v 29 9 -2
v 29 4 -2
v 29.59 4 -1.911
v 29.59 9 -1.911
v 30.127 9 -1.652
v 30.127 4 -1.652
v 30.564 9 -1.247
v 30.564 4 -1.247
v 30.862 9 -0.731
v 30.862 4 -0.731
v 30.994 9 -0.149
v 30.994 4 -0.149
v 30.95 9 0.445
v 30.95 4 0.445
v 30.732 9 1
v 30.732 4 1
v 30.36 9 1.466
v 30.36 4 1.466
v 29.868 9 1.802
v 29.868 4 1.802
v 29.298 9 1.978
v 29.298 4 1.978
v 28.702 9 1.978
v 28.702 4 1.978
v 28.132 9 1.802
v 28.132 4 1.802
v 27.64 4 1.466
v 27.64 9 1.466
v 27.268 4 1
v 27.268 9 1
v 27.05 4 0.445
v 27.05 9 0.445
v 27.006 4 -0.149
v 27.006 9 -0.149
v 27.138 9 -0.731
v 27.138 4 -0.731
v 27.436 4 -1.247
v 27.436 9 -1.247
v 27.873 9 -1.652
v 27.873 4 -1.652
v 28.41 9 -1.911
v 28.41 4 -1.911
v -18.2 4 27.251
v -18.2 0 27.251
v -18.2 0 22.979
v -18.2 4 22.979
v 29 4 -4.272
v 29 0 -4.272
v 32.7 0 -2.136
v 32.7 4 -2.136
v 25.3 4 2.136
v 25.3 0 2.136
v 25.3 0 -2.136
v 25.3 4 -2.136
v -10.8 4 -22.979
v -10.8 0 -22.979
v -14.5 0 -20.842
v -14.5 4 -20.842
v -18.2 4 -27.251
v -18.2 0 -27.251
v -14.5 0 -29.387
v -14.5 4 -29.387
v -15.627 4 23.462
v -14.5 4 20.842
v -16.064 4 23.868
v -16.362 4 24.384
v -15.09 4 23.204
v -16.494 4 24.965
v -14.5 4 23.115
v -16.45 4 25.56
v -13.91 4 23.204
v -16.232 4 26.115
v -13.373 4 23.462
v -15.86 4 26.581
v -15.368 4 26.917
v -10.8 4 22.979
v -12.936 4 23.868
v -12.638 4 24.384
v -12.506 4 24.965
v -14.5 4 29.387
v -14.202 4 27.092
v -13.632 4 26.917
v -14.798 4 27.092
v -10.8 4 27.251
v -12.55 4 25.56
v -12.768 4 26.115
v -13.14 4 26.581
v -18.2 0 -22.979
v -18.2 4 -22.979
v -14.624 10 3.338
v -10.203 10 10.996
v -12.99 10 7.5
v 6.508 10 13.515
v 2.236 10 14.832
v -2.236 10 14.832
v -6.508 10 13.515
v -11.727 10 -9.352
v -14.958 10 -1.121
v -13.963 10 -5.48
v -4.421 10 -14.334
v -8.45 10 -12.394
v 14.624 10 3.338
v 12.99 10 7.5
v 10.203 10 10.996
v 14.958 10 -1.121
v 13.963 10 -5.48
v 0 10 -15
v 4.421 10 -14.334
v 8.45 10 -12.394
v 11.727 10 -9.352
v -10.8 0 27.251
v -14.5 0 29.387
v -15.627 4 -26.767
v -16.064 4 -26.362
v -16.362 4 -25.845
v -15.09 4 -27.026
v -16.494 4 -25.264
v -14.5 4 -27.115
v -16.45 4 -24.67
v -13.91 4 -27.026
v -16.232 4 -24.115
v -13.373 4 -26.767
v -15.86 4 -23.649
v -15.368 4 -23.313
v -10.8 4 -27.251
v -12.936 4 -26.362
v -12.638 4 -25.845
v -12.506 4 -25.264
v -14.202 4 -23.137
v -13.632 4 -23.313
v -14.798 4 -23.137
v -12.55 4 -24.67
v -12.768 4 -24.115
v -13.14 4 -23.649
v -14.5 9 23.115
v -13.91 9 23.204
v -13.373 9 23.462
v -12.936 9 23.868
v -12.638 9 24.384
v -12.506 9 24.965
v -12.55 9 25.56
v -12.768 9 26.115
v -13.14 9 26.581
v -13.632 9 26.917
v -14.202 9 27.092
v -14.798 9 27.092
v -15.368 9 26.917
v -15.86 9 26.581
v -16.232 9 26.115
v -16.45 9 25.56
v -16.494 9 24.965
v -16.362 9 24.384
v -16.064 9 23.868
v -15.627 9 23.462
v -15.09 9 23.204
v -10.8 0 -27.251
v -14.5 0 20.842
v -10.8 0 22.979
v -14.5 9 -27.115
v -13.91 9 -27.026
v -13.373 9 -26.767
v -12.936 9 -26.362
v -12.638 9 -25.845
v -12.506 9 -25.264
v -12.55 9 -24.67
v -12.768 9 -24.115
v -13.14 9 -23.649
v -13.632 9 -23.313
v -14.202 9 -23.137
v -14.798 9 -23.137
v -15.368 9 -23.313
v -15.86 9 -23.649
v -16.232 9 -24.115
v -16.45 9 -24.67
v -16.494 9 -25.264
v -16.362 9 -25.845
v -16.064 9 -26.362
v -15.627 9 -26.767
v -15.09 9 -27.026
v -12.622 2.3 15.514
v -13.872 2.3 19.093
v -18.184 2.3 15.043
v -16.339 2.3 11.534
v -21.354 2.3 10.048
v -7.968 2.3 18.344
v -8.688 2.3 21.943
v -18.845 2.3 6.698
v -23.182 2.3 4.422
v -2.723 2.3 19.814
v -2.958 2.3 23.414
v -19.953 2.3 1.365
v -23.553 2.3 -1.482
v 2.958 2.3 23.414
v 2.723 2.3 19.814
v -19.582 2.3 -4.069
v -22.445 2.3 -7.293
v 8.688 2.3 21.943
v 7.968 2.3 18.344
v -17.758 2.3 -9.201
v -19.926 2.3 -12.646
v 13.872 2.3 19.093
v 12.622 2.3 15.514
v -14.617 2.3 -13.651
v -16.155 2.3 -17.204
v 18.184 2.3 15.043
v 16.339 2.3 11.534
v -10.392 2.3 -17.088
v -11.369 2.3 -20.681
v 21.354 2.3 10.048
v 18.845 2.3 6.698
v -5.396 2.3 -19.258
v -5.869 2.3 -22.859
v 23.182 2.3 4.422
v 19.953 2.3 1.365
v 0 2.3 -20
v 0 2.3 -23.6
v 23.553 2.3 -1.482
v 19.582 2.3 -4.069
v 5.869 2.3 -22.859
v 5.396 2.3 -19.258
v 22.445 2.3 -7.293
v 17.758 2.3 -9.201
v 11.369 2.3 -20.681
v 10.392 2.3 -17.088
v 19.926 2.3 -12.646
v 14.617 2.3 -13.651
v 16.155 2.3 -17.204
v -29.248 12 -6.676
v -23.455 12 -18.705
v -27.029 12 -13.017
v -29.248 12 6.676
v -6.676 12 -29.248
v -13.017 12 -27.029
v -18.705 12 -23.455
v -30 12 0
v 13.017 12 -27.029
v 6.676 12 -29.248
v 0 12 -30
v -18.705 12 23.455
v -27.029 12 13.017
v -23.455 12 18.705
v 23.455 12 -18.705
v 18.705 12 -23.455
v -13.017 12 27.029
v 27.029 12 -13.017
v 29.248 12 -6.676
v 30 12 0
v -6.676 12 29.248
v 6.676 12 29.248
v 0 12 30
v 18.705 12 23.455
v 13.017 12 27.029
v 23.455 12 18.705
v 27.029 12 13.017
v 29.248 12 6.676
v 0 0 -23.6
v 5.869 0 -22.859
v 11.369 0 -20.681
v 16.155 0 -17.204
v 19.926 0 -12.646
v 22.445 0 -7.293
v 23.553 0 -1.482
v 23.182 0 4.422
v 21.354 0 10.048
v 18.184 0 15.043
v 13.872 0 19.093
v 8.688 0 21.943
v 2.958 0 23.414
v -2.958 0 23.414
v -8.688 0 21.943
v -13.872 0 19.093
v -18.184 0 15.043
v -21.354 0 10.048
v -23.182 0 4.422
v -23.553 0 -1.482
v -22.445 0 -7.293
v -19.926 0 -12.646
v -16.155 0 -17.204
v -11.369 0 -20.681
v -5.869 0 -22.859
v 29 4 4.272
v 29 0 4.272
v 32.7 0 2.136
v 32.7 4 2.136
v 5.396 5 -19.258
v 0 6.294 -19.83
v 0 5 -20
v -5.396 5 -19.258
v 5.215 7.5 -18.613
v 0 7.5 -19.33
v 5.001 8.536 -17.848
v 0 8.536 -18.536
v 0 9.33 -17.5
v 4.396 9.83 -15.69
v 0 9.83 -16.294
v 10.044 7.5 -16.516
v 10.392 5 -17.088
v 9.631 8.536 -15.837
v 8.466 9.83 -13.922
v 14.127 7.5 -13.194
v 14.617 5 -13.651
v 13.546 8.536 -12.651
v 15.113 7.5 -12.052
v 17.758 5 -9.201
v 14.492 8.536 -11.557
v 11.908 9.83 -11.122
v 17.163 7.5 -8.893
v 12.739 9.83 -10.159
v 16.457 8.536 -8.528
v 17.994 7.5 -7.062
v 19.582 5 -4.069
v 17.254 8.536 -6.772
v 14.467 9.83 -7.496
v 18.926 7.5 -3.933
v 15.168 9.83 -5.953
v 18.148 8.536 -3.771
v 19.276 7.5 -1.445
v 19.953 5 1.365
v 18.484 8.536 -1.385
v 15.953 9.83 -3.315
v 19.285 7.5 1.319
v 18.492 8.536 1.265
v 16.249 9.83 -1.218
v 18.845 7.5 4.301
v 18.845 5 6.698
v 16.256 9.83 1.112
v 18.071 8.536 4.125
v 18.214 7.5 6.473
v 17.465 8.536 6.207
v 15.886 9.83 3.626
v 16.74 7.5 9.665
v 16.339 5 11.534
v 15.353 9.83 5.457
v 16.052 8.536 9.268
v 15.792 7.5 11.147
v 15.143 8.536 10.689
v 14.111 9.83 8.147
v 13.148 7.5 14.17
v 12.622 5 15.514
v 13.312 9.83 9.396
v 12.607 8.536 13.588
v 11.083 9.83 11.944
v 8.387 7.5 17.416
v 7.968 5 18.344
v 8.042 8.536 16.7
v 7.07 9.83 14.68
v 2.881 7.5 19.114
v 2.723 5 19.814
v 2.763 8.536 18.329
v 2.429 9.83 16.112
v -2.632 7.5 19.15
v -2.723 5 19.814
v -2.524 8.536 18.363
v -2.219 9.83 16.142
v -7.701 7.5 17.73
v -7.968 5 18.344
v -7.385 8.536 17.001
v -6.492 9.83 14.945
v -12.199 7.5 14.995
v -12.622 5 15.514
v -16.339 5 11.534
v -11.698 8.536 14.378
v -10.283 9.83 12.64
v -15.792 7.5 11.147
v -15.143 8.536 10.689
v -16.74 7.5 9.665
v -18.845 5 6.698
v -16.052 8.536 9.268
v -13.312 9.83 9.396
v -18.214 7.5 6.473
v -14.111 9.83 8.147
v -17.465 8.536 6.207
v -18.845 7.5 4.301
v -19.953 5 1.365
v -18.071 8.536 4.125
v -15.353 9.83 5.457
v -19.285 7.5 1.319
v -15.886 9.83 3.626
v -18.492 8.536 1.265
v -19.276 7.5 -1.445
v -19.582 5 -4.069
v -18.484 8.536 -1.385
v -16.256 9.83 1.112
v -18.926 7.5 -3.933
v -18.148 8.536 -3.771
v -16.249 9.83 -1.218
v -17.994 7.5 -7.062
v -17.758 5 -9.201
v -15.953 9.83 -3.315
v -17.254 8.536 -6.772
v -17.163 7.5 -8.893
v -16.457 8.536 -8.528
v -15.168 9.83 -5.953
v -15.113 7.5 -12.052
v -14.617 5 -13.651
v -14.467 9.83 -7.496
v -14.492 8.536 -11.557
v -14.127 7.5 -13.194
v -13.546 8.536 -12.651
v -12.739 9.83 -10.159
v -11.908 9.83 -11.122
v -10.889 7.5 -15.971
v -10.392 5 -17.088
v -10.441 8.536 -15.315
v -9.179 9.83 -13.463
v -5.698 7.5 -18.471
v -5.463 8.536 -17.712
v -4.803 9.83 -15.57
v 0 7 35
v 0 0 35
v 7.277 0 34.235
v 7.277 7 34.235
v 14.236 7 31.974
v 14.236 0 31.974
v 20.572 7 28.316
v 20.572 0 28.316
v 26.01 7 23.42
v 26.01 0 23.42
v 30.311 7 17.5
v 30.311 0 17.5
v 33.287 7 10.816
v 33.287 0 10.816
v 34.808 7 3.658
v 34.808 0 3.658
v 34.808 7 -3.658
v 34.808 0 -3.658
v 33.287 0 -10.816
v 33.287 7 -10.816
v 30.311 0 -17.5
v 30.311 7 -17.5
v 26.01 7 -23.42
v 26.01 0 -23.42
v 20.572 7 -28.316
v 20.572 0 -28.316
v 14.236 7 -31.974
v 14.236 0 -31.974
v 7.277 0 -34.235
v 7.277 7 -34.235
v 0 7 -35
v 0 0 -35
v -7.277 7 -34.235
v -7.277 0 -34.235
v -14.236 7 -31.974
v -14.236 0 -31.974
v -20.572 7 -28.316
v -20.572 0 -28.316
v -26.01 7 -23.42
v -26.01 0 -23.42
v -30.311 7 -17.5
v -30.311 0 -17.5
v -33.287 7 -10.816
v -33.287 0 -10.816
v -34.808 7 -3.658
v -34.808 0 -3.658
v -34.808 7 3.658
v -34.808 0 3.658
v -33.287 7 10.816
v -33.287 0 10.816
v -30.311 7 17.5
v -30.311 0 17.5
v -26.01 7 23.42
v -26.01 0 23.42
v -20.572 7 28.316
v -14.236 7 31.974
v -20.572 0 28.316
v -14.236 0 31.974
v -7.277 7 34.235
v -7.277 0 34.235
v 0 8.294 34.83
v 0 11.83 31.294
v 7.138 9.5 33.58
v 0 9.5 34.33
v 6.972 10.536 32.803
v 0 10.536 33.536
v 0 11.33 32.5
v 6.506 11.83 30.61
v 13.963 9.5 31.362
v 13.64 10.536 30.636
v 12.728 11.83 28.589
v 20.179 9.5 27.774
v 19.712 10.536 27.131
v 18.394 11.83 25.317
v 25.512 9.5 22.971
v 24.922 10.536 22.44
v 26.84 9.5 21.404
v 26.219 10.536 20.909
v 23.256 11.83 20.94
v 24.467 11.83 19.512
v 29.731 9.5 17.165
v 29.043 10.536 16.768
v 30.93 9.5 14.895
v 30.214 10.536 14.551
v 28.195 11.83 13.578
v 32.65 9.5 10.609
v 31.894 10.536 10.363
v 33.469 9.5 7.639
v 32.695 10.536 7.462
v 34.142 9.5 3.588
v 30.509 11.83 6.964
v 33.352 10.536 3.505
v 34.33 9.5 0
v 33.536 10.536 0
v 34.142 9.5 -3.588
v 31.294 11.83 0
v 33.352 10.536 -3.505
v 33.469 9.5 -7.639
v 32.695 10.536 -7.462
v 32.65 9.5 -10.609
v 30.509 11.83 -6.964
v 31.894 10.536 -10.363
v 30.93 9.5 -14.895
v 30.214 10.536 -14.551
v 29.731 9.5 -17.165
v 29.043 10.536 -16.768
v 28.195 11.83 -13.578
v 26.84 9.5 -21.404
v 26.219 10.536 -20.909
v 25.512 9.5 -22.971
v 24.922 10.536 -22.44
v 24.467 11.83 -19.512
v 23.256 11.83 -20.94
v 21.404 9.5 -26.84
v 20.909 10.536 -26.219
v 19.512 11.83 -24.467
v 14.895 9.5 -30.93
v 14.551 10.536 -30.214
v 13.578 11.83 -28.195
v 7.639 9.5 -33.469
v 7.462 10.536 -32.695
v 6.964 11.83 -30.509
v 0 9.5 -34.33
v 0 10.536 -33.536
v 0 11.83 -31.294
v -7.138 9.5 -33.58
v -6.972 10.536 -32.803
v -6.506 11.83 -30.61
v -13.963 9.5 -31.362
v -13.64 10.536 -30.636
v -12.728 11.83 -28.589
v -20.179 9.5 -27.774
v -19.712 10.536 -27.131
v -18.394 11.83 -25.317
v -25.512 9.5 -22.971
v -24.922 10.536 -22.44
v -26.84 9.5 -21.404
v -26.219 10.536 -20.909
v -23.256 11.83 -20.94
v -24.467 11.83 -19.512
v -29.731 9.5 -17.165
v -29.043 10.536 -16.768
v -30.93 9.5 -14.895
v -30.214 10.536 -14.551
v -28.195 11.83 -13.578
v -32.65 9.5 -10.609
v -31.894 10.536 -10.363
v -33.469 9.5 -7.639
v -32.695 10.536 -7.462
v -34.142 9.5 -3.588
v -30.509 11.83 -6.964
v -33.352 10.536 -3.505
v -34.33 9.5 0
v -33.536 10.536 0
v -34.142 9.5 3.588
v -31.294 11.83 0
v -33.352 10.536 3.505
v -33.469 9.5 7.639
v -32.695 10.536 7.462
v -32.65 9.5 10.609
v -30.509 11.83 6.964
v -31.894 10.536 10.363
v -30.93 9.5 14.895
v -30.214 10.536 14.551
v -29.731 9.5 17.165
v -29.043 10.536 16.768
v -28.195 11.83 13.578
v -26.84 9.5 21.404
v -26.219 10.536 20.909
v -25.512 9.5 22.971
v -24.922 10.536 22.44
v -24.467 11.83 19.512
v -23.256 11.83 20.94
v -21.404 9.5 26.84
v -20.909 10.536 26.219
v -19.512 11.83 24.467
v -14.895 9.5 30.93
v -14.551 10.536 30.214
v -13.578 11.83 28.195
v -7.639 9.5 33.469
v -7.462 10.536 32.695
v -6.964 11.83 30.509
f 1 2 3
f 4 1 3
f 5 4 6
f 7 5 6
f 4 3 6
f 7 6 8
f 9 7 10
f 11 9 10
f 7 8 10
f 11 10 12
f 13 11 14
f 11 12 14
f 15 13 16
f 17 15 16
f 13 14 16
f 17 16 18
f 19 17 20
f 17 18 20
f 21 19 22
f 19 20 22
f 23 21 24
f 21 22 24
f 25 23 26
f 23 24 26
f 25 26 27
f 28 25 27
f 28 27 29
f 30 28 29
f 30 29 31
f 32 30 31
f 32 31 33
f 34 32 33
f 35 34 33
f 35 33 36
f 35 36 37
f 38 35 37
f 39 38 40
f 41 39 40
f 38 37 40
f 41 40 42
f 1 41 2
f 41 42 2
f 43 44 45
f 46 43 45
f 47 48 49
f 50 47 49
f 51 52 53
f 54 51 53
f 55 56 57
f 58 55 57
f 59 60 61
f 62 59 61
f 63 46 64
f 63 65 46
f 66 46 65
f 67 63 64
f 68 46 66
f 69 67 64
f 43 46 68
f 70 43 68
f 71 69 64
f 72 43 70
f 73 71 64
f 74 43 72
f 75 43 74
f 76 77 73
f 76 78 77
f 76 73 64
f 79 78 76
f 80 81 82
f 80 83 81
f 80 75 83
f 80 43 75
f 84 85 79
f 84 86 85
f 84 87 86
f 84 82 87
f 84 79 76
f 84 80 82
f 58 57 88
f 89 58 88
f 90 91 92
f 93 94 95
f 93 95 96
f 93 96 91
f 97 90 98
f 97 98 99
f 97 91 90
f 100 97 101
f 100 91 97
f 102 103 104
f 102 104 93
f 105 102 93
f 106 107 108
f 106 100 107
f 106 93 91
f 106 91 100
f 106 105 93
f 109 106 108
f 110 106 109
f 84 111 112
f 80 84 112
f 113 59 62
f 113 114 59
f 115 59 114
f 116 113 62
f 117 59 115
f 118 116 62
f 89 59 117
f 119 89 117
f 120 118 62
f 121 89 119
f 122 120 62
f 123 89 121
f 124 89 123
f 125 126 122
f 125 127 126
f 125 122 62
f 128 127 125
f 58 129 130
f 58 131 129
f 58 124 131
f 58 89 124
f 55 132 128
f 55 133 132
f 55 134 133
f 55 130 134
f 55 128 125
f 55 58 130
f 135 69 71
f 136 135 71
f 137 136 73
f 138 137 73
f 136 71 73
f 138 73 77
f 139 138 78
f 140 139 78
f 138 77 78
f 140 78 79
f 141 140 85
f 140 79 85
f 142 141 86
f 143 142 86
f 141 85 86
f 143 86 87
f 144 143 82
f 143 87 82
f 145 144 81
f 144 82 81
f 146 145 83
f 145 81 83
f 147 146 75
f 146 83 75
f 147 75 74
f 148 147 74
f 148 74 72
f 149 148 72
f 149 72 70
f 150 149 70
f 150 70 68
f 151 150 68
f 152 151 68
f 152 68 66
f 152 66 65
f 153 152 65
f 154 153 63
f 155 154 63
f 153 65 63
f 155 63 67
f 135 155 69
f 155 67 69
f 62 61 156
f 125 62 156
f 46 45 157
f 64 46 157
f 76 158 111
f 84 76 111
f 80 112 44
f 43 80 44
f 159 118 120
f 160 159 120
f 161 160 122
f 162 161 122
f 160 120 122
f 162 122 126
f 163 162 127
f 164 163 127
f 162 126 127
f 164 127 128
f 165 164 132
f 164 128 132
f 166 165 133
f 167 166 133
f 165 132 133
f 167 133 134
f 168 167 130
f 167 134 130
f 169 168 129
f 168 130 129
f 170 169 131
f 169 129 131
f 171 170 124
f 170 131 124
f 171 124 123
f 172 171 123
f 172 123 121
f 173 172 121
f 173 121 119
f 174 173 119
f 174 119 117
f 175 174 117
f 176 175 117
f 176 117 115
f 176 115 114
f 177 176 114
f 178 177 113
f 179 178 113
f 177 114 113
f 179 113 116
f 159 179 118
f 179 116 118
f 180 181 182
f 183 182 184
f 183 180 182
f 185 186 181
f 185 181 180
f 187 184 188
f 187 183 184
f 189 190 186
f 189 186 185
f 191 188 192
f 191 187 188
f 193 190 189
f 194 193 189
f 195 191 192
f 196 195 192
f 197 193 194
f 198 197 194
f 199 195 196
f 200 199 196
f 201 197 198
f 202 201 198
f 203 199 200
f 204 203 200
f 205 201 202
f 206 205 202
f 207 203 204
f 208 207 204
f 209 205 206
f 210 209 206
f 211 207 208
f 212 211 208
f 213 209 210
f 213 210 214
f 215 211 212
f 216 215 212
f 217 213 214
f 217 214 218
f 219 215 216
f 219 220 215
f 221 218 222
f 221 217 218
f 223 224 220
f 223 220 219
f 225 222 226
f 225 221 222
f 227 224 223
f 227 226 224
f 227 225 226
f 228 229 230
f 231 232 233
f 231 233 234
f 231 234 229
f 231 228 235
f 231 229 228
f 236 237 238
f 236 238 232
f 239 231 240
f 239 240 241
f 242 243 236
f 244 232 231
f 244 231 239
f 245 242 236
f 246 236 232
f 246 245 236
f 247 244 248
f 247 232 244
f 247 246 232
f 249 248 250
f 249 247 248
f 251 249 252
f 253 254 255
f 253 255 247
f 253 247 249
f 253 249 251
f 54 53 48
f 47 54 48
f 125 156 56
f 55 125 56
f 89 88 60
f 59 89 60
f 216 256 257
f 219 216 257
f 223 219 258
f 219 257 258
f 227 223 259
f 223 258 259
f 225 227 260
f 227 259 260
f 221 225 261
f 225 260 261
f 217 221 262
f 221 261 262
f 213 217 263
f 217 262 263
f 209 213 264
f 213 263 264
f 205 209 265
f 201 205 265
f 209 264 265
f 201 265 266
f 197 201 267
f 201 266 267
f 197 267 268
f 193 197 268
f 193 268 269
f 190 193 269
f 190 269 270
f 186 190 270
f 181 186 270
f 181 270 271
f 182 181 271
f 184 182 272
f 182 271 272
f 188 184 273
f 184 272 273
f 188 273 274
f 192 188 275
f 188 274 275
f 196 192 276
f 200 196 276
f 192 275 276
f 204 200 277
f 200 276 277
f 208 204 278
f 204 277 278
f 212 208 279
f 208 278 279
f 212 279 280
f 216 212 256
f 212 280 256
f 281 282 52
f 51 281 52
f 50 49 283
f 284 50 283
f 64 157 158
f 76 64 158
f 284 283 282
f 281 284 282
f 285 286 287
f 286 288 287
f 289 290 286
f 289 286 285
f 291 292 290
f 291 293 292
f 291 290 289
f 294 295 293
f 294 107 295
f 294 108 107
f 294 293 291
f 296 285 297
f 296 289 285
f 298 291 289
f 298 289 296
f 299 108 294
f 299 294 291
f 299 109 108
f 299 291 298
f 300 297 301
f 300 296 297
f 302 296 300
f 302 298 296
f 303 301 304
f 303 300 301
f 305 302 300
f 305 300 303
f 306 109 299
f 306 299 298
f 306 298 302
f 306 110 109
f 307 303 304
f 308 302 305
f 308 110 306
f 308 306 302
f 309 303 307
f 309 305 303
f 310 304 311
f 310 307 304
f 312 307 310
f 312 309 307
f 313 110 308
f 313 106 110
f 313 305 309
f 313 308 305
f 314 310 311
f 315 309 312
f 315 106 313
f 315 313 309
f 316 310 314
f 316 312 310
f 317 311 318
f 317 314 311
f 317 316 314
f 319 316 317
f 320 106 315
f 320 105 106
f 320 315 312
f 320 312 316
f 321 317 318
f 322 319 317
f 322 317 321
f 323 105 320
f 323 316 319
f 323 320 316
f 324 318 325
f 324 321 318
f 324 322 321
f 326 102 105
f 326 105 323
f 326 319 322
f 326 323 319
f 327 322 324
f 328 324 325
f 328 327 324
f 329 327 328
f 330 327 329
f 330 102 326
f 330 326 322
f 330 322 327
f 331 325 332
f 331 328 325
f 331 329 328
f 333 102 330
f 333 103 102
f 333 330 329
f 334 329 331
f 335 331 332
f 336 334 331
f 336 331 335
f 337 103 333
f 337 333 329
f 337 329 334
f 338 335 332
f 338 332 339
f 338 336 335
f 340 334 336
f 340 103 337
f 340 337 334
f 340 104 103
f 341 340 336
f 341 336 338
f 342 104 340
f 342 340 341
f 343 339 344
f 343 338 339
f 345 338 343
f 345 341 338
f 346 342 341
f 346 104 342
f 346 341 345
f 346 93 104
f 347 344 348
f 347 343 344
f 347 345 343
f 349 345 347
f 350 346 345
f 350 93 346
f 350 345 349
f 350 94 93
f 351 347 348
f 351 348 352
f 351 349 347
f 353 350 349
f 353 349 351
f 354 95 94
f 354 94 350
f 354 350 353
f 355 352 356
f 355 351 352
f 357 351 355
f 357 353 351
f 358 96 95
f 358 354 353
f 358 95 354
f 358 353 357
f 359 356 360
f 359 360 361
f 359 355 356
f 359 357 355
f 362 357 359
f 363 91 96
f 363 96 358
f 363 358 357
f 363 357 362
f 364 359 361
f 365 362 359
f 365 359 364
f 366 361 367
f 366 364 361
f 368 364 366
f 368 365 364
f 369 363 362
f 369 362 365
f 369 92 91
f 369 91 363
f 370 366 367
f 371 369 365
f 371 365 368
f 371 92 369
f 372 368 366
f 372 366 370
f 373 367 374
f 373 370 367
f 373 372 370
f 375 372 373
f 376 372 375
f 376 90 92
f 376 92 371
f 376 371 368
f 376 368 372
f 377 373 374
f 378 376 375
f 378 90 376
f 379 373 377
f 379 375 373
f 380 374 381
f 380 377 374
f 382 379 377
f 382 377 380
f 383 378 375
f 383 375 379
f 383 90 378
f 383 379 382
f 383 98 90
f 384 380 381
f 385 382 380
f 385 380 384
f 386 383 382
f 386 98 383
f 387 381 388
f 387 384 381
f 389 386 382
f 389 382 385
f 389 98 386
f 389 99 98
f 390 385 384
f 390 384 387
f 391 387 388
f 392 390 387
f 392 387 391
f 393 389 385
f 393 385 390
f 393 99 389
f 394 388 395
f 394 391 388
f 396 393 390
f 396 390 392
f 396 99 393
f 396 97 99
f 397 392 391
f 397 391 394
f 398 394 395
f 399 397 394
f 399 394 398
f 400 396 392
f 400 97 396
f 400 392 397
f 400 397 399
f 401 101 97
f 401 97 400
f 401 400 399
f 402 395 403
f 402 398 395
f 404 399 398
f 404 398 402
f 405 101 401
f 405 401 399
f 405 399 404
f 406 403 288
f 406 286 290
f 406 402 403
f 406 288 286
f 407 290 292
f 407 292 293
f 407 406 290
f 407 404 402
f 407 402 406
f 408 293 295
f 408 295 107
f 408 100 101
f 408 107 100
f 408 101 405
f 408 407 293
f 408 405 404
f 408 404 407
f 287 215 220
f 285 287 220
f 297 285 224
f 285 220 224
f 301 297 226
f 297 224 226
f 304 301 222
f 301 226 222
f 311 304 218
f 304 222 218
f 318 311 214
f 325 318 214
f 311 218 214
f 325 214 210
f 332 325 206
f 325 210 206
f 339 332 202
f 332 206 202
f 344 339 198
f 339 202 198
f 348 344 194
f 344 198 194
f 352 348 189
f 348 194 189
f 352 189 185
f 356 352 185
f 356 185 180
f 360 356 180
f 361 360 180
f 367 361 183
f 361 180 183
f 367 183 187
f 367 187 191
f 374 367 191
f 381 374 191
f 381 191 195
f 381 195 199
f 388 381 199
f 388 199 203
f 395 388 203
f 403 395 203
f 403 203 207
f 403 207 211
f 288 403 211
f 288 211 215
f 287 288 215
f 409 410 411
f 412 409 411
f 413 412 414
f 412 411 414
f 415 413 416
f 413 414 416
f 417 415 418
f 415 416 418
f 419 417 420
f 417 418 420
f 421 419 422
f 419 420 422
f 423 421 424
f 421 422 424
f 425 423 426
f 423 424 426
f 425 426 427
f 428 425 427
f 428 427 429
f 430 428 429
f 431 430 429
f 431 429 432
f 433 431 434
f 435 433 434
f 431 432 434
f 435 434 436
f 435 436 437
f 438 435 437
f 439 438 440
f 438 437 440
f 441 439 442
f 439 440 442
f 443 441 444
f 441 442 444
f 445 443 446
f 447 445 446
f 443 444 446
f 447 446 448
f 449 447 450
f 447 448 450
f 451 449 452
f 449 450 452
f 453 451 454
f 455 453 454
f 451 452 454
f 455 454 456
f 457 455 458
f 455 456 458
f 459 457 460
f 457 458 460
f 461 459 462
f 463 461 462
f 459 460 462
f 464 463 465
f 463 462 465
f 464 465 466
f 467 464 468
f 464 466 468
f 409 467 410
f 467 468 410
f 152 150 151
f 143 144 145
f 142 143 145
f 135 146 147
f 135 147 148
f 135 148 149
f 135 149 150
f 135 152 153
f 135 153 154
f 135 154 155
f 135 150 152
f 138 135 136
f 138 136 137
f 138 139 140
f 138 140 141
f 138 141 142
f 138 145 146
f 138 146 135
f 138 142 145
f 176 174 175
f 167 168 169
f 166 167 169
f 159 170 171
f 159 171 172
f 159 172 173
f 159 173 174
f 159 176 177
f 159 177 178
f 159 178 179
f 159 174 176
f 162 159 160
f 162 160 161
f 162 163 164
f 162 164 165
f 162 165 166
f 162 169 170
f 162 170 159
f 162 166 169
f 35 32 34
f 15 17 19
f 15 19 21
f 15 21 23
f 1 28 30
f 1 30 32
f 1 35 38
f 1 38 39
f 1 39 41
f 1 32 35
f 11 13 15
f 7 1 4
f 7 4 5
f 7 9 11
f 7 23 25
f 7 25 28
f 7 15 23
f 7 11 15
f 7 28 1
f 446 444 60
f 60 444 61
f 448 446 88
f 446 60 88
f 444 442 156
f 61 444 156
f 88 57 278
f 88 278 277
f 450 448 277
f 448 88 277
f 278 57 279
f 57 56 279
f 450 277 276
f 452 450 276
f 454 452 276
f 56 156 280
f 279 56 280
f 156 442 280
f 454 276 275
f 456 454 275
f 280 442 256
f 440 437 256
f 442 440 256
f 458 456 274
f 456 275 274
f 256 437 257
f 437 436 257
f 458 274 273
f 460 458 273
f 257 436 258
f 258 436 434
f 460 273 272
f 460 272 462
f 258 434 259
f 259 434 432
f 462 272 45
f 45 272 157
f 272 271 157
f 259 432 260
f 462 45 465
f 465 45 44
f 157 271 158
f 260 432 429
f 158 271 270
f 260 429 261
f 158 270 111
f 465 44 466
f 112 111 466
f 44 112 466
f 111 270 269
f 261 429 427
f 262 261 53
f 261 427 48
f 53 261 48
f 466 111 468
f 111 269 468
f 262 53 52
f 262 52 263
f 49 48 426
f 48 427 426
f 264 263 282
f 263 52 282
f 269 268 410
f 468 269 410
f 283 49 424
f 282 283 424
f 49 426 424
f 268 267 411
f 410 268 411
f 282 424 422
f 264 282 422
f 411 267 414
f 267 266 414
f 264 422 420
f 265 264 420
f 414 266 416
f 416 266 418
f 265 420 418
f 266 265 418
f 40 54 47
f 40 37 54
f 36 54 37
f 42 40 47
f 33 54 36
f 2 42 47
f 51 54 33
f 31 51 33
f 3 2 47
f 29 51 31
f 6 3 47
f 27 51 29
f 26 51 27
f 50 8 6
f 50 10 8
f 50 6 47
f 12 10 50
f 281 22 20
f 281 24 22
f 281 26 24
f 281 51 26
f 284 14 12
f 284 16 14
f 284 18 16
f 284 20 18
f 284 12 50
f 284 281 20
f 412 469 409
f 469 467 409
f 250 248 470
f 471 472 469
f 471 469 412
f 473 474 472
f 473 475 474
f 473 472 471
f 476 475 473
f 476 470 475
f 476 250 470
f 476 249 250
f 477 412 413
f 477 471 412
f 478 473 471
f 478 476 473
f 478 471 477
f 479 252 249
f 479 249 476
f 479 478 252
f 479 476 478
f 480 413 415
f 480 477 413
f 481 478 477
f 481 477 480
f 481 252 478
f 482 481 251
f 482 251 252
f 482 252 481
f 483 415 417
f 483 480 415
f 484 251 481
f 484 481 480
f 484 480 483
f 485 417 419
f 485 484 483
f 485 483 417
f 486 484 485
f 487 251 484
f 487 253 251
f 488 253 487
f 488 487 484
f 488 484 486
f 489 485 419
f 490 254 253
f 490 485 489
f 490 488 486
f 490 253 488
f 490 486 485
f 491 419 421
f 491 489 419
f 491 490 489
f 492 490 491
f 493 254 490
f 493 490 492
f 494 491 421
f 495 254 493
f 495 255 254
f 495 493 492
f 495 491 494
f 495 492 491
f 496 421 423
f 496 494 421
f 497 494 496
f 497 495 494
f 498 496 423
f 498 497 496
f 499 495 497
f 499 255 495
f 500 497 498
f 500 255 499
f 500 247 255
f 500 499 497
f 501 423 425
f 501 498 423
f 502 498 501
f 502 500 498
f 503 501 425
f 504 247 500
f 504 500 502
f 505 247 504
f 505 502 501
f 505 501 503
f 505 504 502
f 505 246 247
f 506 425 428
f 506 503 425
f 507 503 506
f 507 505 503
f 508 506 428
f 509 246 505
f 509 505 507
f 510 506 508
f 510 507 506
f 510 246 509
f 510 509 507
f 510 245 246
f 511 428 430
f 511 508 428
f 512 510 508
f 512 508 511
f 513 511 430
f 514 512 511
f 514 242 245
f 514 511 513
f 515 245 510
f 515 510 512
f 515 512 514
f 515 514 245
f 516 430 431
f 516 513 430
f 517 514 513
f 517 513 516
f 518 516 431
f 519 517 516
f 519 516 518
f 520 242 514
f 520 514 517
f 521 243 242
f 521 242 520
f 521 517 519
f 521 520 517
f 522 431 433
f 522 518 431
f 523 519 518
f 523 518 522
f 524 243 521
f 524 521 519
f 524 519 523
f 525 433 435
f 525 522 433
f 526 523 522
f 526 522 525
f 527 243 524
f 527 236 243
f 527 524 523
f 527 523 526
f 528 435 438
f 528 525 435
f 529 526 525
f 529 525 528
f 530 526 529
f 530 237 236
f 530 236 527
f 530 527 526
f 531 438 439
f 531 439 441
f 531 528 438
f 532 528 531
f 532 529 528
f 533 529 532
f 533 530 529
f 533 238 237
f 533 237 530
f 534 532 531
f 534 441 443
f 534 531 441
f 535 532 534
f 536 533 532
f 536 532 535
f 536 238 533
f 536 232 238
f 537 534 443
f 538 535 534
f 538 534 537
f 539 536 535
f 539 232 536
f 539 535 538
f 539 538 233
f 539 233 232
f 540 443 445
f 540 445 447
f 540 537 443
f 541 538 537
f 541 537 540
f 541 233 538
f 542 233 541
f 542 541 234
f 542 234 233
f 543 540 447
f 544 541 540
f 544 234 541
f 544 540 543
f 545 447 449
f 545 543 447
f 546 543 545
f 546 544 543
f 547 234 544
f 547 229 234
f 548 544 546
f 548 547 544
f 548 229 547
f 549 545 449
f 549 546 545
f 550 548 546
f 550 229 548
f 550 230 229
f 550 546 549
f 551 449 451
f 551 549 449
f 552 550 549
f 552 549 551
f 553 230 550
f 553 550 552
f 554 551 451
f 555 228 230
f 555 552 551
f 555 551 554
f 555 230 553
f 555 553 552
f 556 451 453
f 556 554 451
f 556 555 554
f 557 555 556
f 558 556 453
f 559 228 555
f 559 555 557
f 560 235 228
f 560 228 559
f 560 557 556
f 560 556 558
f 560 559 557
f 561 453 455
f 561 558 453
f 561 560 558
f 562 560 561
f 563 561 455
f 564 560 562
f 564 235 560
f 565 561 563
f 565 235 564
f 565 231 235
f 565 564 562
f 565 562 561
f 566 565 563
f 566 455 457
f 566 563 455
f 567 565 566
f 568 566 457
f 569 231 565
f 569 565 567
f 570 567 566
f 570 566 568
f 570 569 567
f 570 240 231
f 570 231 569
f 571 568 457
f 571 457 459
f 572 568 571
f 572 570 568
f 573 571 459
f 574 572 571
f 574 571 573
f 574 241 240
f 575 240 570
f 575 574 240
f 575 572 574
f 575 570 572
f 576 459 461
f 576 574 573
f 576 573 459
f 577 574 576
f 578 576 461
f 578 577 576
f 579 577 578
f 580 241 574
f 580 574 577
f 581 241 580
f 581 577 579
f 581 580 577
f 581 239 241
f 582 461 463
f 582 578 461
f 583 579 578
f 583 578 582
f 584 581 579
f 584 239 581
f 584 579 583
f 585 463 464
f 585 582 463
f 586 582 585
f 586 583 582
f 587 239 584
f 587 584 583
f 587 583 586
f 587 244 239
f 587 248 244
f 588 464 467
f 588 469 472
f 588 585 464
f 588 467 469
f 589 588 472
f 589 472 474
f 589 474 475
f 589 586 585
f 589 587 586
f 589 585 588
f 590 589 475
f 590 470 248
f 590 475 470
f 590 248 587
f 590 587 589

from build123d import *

# Parameters (mm, degrees)
SKETCH_1_R          = 35
EXTRUDE_1_DEPTH     = 12
CUT_EXTRUDE_1_DEPTH = 4
SKETCH_3_R          = 2
CUT_EXTRUDE_2_DEPTH = 5
FILLET_1_R          = 5
SKETCH_4_R          = 20
CUT_EXTRUDE_3_DEPTH = 10
FILLET_2_R          = 5
SKETCH_5_R          = 23.6
CUT_EXTRUDE_4_DEPTH = 2.3


with BuildPart() as part:
    # 草图1 → 凸台-拉伸1 (new body)
    with BuildSketch(Plane(origin=(0, 0, 0), x_dir=(1, 0, 0), z_dir=(0, 1, 0))):
        with Locations(Location((0, 0, 0), (0, 0, 270))):
            Circle(SKETCH_1_R)
    extrude(amount=EXTRUDE_1_DEPTH)

    # 草图2 → 切除-拉伸1 (cut)
    with BuildSketch(Plane.XZ):
        Polygon((-18.2, -27.250932706), (-14.5, -29.387128702), (-10.8, -27.250932706), (-10.8, -22.978540714), (-14.5, -20.842344718), (-18.2, -22.978540714), align=None)
        Polygon((32.7, -2.136195996), (32.7, 2.136195996), (29, 4.272391992), (25.3, 2.136195996), (25.3, -2.136195996), (29, -4.272391992), align=None)
        Polygon((-14.5, 29.387128702), (-18.2, 27.250932706), (-18.2, 22.978540714), (-14.5, 20.842344718), (-10.8, 22.978540714), (-10.8, 27.250932706), align=None)
    extrude(amount=-CUT_EXTRUDE_1_DEPTH, mode=Mode.SUBTRACT)

    # 草图3 → 切除-拉伸2 (cut)
    with BuildSketch(Plane.XZ.offset(-4)):
        with Locations(Location((29, 0, 0), (0, 0, 270))):
            Circle(SKETCH_3_R)
        with Locations(Location((-14.5, -25.11473671, 0), (0, 0, 270))):
            Circle(SKETCH_3_R)
        with Locations(Location((-14.5, 25.11473671, 0), (0, 0, 270))):
            Circle(SKETCH_3_R)
    extrude(amount=-CUT_EXTRUDE_2_DEPTH, mode=Mode.SUBTRACT)

    # 圆角1
    fillet_1_edges = [part.edges().sort_by_distance(p)[0] for p in [
        (0, 12, -35),
    ]]
    fillet(fillet_1_edges, radius=FILLET_1_R)

    # 草图4 → 切除-拉伸3 (cut)
    with BuildSketch(Plane.XZ):
        with Locations(Location((0, 0, 0), (0, 0, 270))):
            Circle(SKETCH_4_R)
    extrude(amount=-CUT_EXTRUDE_3_DEPTH, mode=Mode.SUBTRACT)

    # 圆角2
    fillet_2_edges = [part.edges().sort_by_distance(p)[0] for p in [
        (0, 10, 20),
    ]]
    fillet(fillet_2_edges, radius=FILLET_2_R)

    # 草图5 → 切除-拉伸4 (cut)
    with BuildSketch(Plane.XZ):
        with Locations(Location((0, 0, 0), (0, 0, 270))):
            Circle(SKETCH_5_R)
    extrude(amount=-CUT_EXTRUDE_4_DEPTH, mode=Mode.SUBTRACT)


solid = part.part
